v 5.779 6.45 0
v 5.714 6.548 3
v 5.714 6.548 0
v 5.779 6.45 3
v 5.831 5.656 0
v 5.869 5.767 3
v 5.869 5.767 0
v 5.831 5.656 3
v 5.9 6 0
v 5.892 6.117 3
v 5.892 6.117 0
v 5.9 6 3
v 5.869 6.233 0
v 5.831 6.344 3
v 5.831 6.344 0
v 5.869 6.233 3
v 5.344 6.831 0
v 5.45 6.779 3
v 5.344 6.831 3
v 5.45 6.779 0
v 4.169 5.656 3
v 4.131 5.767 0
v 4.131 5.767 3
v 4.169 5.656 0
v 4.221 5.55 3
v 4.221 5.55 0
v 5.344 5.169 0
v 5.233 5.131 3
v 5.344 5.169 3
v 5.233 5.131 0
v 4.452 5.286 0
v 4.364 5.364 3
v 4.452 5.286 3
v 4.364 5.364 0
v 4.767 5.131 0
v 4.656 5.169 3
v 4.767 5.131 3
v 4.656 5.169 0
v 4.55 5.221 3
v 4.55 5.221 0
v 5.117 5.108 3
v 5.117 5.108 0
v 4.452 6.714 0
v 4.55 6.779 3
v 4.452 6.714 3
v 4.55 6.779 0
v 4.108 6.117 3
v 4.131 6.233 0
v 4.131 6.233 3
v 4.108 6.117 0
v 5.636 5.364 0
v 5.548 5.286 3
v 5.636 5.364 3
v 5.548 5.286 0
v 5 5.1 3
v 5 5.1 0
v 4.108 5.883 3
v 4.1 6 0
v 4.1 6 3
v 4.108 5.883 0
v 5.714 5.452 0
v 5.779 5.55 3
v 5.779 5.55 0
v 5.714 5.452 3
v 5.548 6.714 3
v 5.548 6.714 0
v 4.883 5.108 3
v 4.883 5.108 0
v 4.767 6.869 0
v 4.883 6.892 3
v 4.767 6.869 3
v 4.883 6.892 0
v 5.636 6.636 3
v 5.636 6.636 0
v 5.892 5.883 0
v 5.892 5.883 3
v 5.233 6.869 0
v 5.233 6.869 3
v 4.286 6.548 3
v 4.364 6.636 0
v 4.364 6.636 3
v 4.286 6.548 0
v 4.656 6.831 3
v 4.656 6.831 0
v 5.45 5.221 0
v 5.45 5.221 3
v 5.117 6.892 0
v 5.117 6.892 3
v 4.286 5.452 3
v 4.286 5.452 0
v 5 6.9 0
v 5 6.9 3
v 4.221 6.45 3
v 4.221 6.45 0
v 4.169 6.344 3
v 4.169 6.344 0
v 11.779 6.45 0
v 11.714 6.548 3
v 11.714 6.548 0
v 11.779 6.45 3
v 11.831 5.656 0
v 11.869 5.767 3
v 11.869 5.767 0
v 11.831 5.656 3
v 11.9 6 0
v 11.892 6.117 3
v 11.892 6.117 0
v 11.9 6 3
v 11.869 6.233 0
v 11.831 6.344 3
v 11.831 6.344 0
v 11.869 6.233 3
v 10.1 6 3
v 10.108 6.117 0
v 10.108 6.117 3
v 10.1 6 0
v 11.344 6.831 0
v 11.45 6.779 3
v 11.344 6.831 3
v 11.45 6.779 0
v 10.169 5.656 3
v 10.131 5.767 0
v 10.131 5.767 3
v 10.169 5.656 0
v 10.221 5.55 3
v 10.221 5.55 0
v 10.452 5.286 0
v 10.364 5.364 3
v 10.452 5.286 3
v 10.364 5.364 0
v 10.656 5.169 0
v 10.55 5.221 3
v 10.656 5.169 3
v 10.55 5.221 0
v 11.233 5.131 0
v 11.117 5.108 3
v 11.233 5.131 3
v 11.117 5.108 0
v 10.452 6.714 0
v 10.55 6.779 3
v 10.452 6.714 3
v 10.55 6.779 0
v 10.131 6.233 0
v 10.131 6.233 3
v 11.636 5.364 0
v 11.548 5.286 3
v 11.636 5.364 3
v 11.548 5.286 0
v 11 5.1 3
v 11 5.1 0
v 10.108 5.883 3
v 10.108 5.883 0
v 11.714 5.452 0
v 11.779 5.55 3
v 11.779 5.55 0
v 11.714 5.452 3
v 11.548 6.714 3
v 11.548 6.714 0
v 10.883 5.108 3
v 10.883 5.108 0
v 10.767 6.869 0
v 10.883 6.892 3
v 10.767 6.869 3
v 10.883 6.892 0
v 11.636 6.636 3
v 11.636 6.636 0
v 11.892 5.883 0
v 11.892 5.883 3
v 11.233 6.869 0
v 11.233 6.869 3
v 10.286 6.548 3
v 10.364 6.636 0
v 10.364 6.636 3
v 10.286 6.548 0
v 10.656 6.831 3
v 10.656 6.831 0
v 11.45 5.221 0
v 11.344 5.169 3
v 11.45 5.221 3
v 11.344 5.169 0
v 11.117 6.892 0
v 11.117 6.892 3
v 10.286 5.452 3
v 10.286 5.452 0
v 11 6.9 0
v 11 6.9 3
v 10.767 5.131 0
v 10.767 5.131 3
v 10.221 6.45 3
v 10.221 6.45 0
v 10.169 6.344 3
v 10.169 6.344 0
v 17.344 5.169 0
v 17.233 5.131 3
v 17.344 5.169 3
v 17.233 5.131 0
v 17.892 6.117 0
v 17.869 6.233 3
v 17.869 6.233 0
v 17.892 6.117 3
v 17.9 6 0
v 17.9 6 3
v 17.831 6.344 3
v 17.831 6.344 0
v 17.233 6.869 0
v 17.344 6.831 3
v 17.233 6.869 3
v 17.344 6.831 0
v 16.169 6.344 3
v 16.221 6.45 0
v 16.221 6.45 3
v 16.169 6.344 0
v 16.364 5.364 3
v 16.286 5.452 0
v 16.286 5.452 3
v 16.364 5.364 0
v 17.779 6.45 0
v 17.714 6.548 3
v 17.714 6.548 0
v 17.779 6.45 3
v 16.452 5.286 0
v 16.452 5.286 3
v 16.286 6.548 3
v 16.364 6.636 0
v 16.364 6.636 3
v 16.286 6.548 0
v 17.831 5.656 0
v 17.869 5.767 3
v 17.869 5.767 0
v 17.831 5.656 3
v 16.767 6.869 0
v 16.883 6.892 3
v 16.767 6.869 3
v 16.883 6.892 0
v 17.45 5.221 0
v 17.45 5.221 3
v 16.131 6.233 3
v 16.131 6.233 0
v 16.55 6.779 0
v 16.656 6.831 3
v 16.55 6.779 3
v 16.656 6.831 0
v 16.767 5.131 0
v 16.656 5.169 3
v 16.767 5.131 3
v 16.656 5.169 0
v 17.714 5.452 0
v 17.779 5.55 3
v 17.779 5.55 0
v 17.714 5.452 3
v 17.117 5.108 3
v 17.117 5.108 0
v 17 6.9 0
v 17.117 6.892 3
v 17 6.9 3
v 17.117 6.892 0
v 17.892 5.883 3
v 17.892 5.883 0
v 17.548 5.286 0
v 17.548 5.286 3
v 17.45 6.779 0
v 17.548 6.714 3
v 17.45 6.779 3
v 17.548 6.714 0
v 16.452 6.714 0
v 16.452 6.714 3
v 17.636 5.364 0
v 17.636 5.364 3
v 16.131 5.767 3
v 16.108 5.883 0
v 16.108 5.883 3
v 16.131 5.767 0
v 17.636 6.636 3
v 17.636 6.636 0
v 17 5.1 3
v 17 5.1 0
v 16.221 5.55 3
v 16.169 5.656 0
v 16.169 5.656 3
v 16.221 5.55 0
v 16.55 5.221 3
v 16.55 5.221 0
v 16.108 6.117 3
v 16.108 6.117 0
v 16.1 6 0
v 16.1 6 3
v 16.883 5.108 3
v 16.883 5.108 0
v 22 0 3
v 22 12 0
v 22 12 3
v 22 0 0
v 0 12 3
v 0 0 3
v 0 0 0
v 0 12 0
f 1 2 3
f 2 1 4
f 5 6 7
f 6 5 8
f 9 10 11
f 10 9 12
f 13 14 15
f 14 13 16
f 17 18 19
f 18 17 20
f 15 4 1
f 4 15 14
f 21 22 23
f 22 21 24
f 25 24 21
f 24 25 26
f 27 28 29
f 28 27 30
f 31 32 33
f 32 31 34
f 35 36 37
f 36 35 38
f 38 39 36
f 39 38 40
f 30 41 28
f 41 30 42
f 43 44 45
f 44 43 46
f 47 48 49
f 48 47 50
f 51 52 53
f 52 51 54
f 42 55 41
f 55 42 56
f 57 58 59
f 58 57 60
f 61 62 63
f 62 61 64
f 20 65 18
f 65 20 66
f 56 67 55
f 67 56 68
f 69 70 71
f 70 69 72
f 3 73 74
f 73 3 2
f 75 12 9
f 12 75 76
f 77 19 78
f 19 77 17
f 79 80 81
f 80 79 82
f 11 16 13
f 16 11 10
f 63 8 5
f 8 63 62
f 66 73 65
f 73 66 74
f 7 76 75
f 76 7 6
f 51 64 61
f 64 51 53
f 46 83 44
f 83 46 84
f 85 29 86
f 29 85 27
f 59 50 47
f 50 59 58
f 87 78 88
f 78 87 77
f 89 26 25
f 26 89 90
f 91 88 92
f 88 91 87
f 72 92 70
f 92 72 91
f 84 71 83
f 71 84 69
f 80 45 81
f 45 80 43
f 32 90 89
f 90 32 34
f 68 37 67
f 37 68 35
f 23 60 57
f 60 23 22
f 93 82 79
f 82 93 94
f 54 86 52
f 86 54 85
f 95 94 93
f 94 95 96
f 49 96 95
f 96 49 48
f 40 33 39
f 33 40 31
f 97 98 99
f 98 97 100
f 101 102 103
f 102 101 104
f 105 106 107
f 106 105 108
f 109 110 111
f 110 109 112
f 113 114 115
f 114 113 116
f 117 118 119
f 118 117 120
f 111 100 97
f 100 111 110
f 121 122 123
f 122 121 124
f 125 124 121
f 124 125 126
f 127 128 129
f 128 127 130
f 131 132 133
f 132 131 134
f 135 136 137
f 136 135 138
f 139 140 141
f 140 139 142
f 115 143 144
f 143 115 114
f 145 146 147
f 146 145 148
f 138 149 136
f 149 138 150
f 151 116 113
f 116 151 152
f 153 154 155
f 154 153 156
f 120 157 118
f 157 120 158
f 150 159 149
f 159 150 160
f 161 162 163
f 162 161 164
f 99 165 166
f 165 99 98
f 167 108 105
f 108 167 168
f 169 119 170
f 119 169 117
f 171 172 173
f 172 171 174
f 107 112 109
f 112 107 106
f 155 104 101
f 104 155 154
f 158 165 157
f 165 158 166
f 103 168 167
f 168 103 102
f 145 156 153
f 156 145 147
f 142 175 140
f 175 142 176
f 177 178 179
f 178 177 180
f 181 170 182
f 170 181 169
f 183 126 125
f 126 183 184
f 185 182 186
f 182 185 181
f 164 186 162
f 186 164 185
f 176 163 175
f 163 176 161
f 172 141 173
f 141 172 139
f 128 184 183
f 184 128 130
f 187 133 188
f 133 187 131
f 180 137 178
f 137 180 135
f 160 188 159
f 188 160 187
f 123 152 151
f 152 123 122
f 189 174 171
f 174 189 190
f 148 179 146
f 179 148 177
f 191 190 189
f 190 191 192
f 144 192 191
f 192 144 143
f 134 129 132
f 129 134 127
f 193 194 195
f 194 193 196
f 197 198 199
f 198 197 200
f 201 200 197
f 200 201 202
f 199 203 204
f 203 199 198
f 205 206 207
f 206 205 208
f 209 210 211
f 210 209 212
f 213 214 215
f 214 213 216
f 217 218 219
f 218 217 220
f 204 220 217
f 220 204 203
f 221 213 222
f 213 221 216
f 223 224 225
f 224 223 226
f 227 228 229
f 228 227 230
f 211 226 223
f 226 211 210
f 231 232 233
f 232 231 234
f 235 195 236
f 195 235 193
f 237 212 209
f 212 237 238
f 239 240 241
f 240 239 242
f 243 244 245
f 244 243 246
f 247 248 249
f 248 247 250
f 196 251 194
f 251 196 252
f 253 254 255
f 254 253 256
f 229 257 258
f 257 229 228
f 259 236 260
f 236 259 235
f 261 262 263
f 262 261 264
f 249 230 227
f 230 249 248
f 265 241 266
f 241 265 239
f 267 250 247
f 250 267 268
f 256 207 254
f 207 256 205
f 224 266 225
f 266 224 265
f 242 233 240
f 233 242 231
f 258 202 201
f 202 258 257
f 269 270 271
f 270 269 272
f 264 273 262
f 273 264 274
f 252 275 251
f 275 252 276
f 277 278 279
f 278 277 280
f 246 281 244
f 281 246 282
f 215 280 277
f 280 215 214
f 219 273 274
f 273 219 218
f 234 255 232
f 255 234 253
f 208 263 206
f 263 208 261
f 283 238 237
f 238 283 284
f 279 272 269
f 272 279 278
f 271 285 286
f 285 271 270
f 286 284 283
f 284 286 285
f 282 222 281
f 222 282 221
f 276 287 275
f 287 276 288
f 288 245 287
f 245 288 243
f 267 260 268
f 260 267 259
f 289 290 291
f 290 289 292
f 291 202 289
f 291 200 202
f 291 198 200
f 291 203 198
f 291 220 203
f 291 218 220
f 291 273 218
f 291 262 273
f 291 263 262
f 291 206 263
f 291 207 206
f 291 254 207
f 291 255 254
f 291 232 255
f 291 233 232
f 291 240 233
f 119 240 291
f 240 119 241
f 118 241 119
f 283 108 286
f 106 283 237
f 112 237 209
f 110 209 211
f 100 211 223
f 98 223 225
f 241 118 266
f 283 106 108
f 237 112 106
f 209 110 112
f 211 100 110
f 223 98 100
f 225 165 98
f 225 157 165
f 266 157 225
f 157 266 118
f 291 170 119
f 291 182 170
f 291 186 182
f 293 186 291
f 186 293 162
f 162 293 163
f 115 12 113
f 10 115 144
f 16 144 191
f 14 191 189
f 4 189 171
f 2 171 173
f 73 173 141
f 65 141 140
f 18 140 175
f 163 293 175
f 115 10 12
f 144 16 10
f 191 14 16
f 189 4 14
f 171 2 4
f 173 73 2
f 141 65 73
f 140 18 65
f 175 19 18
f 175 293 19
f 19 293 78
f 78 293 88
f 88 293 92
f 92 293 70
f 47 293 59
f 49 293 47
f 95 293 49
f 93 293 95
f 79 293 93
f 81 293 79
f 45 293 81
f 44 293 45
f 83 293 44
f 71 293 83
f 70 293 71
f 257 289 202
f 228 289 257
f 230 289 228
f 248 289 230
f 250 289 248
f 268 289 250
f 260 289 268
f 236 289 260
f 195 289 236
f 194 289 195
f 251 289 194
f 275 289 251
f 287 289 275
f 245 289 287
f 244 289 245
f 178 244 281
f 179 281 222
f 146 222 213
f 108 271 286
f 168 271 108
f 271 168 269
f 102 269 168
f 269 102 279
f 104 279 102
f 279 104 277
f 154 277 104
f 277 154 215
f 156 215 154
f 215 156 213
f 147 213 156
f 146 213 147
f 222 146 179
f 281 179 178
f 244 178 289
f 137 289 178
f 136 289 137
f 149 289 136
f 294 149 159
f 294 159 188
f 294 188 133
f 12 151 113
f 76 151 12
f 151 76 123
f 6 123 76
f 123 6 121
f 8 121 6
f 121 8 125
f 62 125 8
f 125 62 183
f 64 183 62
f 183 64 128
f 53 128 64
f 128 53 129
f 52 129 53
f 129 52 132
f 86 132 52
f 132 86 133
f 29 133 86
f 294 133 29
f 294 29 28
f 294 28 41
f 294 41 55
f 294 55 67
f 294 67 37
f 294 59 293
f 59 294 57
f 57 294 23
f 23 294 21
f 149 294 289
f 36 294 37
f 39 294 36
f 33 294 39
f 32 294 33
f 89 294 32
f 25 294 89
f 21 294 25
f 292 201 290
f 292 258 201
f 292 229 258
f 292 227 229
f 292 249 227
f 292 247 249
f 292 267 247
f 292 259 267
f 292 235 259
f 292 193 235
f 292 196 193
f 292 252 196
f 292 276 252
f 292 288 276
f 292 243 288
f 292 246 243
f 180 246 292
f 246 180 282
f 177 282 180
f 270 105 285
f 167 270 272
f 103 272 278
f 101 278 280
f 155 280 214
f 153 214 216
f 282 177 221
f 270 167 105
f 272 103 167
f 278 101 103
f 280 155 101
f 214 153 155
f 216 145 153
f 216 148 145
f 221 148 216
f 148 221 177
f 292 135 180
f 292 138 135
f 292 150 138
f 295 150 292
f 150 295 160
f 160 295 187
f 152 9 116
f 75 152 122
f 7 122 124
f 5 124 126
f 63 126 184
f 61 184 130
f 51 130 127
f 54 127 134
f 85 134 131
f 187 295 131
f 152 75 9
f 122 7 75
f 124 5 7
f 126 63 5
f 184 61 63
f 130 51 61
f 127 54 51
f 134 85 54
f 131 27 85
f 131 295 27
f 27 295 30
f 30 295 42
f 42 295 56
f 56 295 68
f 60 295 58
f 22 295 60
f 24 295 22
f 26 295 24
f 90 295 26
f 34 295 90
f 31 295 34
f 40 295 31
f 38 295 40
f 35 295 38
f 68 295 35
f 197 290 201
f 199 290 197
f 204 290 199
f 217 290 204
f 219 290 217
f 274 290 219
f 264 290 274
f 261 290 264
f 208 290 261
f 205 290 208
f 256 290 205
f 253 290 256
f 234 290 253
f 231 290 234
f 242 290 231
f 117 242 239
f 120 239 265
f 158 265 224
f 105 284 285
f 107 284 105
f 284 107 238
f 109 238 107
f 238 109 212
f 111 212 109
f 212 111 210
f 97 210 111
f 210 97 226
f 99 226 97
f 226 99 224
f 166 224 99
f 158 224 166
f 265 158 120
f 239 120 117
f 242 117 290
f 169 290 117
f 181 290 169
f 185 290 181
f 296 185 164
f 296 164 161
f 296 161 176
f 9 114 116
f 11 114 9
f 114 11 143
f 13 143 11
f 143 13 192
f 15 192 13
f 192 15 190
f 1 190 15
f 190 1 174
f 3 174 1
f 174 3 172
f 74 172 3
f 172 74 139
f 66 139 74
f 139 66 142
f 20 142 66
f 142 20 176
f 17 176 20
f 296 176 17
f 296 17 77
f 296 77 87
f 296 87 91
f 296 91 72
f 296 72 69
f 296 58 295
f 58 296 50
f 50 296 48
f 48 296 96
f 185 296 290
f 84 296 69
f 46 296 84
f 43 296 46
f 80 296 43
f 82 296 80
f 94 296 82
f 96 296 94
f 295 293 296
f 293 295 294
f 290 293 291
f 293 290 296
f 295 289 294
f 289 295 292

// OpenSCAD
// Flat three-hole drill guide for East30 sap-flux sensor needles.
// Override style or bit_size from the OpenSCAD command line as needed.

style = "equidistant"; // "equidistant" or "riley"
bit_size = 55;         // 54 (1.397 mm) or 55 (1.321 mm)
guide_width = 12;
guide_thickness = 3;
edge_margin = 5;

// These CAD diameters include compensation for the first print's undersized
// 1.6 mm holes, plus enough running clearance to avoid heating the plastic.
hole_diameter = bit_size == 54 ? 1.9 : 1.8;
hole_offsets = style == "riley" ? [0, 10, 15] : [0, 6, 12];
guide_length = hole_offsets[len(hole_offsets) - 1] + 2 * edge_margin;

difference() {
    cube([guide_length, guide_width, guide_thickness]);

    for (offset = hole_offsets) {
        translate([edge_margin + offset, guide_width / 2, -0.1])
            cylinder(h = guide_thickness + 0.2, d = hole_diameter, $fn = 48);
    }
}
